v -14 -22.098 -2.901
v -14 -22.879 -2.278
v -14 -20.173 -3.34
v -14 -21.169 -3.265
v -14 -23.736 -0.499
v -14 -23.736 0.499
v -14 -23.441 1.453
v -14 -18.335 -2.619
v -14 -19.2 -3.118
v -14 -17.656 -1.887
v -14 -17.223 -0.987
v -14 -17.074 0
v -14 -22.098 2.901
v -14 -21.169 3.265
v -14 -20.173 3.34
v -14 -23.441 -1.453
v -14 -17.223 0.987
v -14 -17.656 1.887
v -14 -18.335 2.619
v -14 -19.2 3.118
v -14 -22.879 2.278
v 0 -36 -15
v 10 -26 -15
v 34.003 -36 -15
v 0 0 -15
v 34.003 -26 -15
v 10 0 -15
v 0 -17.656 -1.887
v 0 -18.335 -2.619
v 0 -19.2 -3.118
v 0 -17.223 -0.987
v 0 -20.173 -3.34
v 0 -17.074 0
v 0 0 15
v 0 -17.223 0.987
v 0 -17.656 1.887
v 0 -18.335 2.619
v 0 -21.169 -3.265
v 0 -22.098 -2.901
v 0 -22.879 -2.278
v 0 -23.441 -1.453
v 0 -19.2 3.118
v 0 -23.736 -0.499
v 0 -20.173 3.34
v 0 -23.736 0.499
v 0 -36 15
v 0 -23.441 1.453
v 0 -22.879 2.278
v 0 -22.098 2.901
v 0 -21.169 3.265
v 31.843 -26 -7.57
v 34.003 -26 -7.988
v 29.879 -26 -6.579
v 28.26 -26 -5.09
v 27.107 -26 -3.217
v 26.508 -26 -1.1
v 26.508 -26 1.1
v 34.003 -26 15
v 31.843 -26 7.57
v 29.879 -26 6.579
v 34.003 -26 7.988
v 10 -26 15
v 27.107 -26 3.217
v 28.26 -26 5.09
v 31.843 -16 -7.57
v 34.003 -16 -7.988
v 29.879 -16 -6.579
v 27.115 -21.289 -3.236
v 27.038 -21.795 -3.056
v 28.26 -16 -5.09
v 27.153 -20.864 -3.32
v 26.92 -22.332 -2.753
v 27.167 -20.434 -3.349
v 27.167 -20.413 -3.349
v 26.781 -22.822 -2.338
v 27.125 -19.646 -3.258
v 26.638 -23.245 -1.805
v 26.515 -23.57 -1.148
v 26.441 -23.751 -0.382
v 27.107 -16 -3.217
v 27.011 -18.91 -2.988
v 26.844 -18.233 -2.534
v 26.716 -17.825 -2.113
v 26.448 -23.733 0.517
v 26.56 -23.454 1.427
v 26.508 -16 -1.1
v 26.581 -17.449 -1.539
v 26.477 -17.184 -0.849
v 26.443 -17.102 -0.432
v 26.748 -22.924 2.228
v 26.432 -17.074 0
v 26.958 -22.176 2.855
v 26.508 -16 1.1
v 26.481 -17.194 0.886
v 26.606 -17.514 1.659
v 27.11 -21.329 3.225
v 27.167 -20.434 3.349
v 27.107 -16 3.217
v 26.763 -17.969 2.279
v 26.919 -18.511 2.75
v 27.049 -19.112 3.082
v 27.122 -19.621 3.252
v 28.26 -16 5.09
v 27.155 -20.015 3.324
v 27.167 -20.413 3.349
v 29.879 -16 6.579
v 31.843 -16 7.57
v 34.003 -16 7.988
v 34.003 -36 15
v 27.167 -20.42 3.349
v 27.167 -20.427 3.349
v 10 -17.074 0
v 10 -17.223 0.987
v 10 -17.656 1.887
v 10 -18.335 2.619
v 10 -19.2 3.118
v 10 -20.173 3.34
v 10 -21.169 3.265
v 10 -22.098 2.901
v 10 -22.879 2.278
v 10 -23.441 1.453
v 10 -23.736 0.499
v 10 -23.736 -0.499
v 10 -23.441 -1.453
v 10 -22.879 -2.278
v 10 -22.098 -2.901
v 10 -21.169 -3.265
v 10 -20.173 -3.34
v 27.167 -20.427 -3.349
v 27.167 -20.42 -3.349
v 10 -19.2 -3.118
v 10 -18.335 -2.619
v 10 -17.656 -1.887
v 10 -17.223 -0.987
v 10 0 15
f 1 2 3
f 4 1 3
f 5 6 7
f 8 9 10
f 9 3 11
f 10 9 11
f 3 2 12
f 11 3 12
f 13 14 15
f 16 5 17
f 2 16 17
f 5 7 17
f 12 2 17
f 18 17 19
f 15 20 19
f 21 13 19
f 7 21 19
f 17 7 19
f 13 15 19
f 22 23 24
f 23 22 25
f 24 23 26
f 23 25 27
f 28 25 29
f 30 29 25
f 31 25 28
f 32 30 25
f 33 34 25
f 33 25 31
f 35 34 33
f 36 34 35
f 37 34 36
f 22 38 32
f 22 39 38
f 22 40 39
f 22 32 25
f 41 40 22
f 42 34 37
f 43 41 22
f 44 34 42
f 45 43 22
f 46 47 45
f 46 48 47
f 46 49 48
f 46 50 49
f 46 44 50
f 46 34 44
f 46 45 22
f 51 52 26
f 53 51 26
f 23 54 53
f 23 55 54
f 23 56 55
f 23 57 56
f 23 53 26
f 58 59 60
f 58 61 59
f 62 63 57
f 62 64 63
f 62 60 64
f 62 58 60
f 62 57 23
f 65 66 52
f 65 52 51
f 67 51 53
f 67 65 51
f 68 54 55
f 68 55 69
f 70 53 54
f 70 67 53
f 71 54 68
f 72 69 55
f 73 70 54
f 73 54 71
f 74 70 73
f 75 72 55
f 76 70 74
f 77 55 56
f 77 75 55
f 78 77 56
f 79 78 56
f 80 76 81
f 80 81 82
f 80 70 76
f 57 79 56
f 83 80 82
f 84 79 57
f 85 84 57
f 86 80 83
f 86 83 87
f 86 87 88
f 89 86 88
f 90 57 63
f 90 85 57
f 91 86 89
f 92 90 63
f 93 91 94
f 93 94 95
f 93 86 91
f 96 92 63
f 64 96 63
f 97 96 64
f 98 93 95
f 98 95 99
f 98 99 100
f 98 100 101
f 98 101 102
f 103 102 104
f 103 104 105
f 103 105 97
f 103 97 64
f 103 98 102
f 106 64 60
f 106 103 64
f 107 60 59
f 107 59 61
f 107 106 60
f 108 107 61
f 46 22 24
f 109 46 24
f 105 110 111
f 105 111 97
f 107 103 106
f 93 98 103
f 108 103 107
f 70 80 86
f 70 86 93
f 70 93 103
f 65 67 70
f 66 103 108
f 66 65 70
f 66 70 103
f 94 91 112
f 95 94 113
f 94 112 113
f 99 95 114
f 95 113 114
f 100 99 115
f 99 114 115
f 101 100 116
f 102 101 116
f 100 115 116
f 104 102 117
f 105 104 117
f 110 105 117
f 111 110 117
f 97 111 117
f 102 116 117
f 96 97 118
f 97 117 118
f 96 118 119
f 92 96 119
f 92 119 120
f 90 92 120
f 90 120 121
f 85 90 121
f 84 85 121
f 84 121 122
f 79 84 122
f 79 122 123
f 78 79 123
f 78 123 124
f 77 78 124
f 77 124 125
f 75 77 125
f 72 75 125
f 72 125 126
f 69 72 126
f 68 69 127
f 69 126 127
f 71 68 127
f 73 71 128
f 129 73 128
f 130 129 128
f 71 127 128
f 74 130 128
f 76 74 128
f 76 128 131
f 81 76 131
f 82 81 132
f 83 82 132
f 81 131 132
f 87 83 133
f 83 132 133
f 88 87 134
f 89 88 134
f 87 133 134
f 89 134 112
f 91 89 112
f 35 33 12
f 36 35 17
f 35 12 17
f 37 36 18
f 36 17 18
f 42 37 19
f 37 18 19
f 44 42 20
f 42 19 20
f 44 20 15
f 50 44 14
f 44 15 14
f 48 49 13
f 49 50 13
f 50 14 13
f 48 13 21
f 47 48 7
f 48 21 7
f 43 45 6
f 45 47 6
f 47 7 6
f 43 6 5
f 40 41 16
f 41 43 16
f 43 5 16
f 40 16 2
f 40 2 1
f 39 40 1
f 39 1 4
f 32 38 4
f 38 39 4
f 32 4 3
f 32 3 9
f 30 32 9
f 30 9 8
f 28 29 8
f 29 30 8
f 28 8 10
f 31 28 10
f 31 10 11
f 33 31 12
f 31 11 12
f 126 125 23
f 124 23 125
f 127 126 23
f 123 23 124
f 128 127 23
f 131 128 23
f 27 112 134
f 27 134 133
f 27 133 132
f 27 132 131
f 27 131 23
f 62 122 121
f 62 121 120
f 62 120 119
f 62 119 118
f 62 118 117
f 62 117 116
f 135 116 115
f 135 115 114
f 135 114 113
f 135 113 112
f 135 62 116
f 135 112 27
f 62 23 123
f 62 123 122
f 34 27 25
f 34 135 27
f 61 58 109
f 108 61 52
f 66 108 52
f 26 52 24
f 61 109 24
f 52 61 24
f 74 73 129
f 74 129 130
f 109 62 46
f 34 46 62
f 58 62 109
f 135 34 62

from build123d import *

# Parameters (mm, degrees)
EXTRUDE_1_DEPTH          = 15
SKETCH_3_R               = 8
EXTRUDE_2_DEPTH          = 10
CUT_EXTRUDE_3_DEPTH      = 68.089492471
CUT_EXTRUDE_3_DEPTH_BACK = 68.089492471
SKETCH_4_W               = 25.997124379
SKETCH_4_H               = 30
EXTRUDE_START            = -24
SKETCH_5_R               = 3.349390617
EXTRUDE_13_DEPTH         = 41.166654


with BuildPart() as part:
    # 草图2 → 凸台-拉伸1 (new, symmetric)
    with BuildSketch(Plane.XY):
        Polygon((0, 0), (0, -36), (60, -36), (60, -26), (10, -26), (10, 0), align=None)
    extrude(amount=EXTRUDE_1_DEPTH, both=True)

    # 草图3 → 凸台-拉伸2 (add, symmetric)
    with BuildSketch(Plane(origin=(0, -26, 0), x_dir=(1, 0, 0), z_dir=(0, 1, 0))):
        with Locations((34.431755152, 0)):
            Circle(SKETCH_3_R)
    extrude(amount=EXTRUDE_2_DEPTH, both=True)

    # 草图4 → 切除-拉伸3 (cut, two sides: drawn at the far end of the back side and taken through both)
    with BuildSketch(Plane(origin=(0, -26, 0), x_dir=(1, 0, 0), z_dir=(0, 1, 0)).offset(-CUT_EXTRUDE_3_DEPTH_BACK)):
        with Locations((47.001437811, 0)):
            Rectangle(SKETCH_4_W, SKETCH_4_H)
    extrude(amount=CUT_EXTRUDE_3_DEPTH + CUT_EXTRUDE_3_DEPTH_BACK, mode=Mode.SUBTRACT)

    # 草图5 → 凸台-拉伸13 (add)
    with BuildSketch(Plane(origin=(10, 0, 0), x_dir=(0, 0, -1), z_dir=(1, 0, 0)).offset(EXTRUDE_START)):
        with Locations(Location((0, -20.42358982, 0), (0, 0, 90))):
            Circle(SKETCH_5_R)
    extrude(amount=EXTRUDE_13_DEPTH)


solid = part.part
